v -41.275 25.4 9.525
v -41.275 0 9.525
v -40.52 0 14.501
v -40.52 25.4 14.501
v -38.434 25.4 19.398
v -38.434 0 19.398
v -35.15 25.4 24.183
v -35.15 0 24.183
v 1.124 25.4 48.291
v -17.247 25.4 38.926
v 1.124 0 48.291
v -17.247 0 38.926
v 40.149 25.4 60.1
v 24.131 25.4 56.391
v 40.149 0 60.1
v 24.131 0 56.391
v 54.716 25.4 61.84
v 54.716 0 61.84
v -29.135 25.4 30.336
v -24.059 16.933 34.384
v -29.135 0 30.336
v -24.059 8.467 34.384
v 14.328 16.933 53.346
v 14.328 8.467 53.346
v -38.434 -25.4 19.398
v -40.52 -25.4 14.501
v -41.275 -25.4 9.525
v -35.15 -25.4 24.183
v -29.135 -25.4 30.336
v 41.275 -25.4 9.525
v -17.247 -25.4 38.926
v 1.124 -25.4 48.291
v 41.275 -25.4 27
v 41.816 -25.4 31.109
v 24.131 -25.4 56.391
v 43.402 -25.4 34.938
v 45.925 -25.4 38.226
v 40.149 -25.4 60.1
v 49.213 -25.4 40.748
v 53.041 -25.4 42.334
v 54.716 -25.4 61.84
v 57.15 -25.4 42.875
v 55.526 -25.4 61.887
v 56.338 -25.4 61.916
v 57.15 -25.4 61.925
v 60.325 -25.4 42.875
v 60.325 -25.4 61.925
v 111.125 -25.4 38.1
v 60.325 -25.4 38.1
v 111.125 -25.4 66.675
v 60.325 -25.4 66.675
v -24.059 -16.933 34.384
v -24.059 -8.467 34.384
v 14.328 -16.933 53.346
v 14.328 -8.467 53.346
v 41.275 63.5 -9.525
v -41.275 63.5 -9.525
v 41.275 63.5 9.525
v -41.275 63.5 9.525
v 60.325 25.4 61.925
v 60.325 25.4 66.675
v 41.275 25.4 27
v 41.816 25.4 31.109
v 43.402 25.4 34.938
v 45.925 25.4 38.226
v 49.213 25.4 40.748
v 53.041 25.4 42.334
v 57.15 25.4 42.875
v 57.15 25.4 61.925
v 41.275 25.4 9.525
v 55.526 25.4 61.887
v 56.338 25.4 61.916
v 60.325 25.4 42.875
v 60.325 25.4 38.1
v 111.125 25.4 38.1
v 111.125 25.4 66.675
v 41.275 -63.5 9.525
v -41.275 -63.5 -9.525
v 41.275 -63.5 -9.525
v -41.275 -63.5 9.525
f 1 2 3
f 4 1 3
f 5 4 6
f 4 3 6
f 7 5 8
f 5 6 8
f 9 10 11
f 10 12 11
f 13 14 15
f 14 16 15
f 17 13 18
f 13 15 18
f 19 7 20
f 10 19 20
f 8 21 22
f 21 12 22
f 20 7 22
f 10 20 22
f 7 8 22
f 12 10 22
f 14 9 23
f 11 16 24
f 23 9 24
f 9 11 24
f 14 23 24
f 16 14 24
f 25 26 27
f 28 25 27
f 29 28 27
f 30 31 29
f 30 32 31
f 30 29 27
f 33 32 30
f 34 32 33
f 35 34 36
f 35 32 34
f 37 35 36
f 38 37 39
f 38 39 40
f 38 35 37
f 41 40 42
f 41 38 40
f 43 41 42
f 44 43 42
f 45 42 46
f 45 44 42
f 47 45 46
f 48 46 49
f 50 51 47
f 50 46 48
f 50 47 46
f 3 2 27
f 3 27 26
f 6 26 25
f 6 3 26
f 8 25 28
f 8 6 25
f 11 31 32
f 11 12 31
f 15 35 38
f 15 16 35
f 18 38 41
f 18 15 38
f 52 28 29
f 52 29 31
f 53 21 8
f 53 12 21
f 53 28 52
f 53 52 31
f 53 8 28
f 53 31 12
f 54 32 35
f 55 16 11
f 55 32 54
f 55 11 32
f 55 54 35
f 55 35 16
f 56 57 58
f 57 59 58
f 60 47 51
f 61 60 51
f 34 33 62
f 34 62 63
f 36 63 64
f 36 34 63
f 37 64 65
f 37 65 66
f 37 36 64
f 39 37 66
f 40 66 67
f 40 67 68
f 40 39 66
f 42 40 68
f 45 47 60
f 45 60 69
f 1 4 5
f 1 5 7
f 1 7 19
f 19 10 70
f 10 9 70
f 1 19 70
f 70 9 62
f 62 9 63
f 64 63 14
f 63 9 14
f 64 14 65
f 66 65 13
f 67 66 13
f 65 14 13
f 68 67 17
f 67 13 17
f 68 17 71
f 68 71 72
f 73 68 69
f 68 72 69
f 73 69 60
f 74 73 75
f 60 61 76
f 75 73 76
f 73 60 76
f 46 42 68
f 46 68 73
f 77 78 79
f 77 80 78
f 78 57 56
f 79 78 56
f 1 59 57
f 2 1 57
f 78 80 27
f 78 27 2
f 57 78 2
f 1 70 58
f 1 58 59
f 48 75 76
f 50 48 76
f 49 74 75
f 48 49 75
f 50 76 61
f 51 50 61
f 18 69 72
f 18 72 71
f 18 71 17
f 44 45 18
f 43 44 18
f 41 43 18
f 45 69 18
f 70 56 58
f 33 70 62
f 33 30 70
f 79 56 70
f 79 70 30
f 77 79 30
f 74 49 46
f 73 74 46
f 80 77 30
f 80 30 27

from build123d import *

# Parameters (mm, degrees)
F1_DEPTH = 63.5
F0_W     = 25.4
F0_H     = 4.7752
F0_H_2   = 19.05
F0_H_3   = 4.7498
F2_DEPTH = 25.4


with BuildPart() as f1:
    # F0 (on Front) → F1 (new body, symmetric)
    with BuildSketch(Plane.XZ):
        Polygon((-41.275, -9.525), (41.275, -9.525), (41.275, 9.525), (22.225, 9.525), (-41.275, 9.525), align=None)
    extrude(amount=F1_DEPTH, both=True)

    # F0 (on Front) → F2 (join, symmetric)
    with BuildSketch(Plane.XZ):
        Polygon((-41.275, -9.525), (41.275, -9.525), (41.275, 9.525), (22.225, 9.525), (-41.275, 9.525), align=None)
        with BuildLine():
            Line((22.225, 9.525), (41.275, 9.525))
            Line((41.275, 9.525), (41.275, 27.0002))
            ThreePointArc((41.275, 27.0002), (45.9246798487, 38.2255201513), (57.15, 42.8752))
            Line((57.15, 42.8752), (60.325, 42.8752))
            Line((60.325, 42.8752), (60.325, 61.9252))
            Line((60.325, 61.9252), (57.15, 61.9252))
            add(Edge.make_bspline(
                [(54.7155660835, 61.8402510405), (55.5417802596, 61.8812323072), (56.3536366675, 61.9096388708), (57.15, 61.9252)],
                knots=[108.932762341, 108.932762341, 108.932762341, 108.932762341, 111.5045361635, 111.5045361635, 111.5045361635, 111.5045361635], degree=3))
            ThreePointArc((54.7155660835, 61.8402510405), (31.6080910117, 50.8196565478), (22.225, 27.0002))
            Line((22.225, 27.0002), (22.225, 9.525))
        make_face()
        with BuildLine():
            add(Edge.make_bspline(
                [(-41.275, 9.525), (-41.0359900889, 35.8080333055), (19.7195677178, 60.1044053224), (54.7155660835, 61.8402510405)],
                knots=[0, 0, 0, 0, 108.932762341, 108.932762341, 108.932762341, 108.932762341], degree=3))
            Line((-41.275, 9.525), (22.225, 9.525))
            Line((22.225, 9.525), (22.225, 27.0002))
            ThreePointArc((22.225, 27.0002), (31.6080910117, 50.8196565478), (54.7155660835, 61.8402510405))
        make_face()
        with BuildLine():
            ThreePointArc((57.15, 61.9252), (55.9320421991, 61.9039562992), (54.7155660835, 61.8402510405))
            add(Edge.make_bspline(
                [(54.7155660835, 61.8402510405), (55.5417802596, 61.8812323072), (56.3536366675, 61.9096388708), (57.15, 61.9252)],
                knots=[108.932762341, 108.932762341, 108.932762341, 108.932762341, 111.5045361635, 111.5045361635, 111.5045361635, 111.5045361635], degree=3))
        make_face()
        with Locations((73.025, 40.4876)):
            Rectangle(F0_W, F0_H)
        with Locations((73.025, 52.4002)):
            Rectangle(F0_W, F0_H_2)
        with Locations((73.025, 64.3001)):
            Rectangle(F0_W, F0_H_3)
        Polygon((85.725, 61.9252), (85.725, 42.8752), (85.725, 38.1), (111.125, 38.1), (111.125, 66.675), (85.725, 66.675), align=None)
    extrude(amount=F2_DEPTH, both=True)


solid = f1.part
